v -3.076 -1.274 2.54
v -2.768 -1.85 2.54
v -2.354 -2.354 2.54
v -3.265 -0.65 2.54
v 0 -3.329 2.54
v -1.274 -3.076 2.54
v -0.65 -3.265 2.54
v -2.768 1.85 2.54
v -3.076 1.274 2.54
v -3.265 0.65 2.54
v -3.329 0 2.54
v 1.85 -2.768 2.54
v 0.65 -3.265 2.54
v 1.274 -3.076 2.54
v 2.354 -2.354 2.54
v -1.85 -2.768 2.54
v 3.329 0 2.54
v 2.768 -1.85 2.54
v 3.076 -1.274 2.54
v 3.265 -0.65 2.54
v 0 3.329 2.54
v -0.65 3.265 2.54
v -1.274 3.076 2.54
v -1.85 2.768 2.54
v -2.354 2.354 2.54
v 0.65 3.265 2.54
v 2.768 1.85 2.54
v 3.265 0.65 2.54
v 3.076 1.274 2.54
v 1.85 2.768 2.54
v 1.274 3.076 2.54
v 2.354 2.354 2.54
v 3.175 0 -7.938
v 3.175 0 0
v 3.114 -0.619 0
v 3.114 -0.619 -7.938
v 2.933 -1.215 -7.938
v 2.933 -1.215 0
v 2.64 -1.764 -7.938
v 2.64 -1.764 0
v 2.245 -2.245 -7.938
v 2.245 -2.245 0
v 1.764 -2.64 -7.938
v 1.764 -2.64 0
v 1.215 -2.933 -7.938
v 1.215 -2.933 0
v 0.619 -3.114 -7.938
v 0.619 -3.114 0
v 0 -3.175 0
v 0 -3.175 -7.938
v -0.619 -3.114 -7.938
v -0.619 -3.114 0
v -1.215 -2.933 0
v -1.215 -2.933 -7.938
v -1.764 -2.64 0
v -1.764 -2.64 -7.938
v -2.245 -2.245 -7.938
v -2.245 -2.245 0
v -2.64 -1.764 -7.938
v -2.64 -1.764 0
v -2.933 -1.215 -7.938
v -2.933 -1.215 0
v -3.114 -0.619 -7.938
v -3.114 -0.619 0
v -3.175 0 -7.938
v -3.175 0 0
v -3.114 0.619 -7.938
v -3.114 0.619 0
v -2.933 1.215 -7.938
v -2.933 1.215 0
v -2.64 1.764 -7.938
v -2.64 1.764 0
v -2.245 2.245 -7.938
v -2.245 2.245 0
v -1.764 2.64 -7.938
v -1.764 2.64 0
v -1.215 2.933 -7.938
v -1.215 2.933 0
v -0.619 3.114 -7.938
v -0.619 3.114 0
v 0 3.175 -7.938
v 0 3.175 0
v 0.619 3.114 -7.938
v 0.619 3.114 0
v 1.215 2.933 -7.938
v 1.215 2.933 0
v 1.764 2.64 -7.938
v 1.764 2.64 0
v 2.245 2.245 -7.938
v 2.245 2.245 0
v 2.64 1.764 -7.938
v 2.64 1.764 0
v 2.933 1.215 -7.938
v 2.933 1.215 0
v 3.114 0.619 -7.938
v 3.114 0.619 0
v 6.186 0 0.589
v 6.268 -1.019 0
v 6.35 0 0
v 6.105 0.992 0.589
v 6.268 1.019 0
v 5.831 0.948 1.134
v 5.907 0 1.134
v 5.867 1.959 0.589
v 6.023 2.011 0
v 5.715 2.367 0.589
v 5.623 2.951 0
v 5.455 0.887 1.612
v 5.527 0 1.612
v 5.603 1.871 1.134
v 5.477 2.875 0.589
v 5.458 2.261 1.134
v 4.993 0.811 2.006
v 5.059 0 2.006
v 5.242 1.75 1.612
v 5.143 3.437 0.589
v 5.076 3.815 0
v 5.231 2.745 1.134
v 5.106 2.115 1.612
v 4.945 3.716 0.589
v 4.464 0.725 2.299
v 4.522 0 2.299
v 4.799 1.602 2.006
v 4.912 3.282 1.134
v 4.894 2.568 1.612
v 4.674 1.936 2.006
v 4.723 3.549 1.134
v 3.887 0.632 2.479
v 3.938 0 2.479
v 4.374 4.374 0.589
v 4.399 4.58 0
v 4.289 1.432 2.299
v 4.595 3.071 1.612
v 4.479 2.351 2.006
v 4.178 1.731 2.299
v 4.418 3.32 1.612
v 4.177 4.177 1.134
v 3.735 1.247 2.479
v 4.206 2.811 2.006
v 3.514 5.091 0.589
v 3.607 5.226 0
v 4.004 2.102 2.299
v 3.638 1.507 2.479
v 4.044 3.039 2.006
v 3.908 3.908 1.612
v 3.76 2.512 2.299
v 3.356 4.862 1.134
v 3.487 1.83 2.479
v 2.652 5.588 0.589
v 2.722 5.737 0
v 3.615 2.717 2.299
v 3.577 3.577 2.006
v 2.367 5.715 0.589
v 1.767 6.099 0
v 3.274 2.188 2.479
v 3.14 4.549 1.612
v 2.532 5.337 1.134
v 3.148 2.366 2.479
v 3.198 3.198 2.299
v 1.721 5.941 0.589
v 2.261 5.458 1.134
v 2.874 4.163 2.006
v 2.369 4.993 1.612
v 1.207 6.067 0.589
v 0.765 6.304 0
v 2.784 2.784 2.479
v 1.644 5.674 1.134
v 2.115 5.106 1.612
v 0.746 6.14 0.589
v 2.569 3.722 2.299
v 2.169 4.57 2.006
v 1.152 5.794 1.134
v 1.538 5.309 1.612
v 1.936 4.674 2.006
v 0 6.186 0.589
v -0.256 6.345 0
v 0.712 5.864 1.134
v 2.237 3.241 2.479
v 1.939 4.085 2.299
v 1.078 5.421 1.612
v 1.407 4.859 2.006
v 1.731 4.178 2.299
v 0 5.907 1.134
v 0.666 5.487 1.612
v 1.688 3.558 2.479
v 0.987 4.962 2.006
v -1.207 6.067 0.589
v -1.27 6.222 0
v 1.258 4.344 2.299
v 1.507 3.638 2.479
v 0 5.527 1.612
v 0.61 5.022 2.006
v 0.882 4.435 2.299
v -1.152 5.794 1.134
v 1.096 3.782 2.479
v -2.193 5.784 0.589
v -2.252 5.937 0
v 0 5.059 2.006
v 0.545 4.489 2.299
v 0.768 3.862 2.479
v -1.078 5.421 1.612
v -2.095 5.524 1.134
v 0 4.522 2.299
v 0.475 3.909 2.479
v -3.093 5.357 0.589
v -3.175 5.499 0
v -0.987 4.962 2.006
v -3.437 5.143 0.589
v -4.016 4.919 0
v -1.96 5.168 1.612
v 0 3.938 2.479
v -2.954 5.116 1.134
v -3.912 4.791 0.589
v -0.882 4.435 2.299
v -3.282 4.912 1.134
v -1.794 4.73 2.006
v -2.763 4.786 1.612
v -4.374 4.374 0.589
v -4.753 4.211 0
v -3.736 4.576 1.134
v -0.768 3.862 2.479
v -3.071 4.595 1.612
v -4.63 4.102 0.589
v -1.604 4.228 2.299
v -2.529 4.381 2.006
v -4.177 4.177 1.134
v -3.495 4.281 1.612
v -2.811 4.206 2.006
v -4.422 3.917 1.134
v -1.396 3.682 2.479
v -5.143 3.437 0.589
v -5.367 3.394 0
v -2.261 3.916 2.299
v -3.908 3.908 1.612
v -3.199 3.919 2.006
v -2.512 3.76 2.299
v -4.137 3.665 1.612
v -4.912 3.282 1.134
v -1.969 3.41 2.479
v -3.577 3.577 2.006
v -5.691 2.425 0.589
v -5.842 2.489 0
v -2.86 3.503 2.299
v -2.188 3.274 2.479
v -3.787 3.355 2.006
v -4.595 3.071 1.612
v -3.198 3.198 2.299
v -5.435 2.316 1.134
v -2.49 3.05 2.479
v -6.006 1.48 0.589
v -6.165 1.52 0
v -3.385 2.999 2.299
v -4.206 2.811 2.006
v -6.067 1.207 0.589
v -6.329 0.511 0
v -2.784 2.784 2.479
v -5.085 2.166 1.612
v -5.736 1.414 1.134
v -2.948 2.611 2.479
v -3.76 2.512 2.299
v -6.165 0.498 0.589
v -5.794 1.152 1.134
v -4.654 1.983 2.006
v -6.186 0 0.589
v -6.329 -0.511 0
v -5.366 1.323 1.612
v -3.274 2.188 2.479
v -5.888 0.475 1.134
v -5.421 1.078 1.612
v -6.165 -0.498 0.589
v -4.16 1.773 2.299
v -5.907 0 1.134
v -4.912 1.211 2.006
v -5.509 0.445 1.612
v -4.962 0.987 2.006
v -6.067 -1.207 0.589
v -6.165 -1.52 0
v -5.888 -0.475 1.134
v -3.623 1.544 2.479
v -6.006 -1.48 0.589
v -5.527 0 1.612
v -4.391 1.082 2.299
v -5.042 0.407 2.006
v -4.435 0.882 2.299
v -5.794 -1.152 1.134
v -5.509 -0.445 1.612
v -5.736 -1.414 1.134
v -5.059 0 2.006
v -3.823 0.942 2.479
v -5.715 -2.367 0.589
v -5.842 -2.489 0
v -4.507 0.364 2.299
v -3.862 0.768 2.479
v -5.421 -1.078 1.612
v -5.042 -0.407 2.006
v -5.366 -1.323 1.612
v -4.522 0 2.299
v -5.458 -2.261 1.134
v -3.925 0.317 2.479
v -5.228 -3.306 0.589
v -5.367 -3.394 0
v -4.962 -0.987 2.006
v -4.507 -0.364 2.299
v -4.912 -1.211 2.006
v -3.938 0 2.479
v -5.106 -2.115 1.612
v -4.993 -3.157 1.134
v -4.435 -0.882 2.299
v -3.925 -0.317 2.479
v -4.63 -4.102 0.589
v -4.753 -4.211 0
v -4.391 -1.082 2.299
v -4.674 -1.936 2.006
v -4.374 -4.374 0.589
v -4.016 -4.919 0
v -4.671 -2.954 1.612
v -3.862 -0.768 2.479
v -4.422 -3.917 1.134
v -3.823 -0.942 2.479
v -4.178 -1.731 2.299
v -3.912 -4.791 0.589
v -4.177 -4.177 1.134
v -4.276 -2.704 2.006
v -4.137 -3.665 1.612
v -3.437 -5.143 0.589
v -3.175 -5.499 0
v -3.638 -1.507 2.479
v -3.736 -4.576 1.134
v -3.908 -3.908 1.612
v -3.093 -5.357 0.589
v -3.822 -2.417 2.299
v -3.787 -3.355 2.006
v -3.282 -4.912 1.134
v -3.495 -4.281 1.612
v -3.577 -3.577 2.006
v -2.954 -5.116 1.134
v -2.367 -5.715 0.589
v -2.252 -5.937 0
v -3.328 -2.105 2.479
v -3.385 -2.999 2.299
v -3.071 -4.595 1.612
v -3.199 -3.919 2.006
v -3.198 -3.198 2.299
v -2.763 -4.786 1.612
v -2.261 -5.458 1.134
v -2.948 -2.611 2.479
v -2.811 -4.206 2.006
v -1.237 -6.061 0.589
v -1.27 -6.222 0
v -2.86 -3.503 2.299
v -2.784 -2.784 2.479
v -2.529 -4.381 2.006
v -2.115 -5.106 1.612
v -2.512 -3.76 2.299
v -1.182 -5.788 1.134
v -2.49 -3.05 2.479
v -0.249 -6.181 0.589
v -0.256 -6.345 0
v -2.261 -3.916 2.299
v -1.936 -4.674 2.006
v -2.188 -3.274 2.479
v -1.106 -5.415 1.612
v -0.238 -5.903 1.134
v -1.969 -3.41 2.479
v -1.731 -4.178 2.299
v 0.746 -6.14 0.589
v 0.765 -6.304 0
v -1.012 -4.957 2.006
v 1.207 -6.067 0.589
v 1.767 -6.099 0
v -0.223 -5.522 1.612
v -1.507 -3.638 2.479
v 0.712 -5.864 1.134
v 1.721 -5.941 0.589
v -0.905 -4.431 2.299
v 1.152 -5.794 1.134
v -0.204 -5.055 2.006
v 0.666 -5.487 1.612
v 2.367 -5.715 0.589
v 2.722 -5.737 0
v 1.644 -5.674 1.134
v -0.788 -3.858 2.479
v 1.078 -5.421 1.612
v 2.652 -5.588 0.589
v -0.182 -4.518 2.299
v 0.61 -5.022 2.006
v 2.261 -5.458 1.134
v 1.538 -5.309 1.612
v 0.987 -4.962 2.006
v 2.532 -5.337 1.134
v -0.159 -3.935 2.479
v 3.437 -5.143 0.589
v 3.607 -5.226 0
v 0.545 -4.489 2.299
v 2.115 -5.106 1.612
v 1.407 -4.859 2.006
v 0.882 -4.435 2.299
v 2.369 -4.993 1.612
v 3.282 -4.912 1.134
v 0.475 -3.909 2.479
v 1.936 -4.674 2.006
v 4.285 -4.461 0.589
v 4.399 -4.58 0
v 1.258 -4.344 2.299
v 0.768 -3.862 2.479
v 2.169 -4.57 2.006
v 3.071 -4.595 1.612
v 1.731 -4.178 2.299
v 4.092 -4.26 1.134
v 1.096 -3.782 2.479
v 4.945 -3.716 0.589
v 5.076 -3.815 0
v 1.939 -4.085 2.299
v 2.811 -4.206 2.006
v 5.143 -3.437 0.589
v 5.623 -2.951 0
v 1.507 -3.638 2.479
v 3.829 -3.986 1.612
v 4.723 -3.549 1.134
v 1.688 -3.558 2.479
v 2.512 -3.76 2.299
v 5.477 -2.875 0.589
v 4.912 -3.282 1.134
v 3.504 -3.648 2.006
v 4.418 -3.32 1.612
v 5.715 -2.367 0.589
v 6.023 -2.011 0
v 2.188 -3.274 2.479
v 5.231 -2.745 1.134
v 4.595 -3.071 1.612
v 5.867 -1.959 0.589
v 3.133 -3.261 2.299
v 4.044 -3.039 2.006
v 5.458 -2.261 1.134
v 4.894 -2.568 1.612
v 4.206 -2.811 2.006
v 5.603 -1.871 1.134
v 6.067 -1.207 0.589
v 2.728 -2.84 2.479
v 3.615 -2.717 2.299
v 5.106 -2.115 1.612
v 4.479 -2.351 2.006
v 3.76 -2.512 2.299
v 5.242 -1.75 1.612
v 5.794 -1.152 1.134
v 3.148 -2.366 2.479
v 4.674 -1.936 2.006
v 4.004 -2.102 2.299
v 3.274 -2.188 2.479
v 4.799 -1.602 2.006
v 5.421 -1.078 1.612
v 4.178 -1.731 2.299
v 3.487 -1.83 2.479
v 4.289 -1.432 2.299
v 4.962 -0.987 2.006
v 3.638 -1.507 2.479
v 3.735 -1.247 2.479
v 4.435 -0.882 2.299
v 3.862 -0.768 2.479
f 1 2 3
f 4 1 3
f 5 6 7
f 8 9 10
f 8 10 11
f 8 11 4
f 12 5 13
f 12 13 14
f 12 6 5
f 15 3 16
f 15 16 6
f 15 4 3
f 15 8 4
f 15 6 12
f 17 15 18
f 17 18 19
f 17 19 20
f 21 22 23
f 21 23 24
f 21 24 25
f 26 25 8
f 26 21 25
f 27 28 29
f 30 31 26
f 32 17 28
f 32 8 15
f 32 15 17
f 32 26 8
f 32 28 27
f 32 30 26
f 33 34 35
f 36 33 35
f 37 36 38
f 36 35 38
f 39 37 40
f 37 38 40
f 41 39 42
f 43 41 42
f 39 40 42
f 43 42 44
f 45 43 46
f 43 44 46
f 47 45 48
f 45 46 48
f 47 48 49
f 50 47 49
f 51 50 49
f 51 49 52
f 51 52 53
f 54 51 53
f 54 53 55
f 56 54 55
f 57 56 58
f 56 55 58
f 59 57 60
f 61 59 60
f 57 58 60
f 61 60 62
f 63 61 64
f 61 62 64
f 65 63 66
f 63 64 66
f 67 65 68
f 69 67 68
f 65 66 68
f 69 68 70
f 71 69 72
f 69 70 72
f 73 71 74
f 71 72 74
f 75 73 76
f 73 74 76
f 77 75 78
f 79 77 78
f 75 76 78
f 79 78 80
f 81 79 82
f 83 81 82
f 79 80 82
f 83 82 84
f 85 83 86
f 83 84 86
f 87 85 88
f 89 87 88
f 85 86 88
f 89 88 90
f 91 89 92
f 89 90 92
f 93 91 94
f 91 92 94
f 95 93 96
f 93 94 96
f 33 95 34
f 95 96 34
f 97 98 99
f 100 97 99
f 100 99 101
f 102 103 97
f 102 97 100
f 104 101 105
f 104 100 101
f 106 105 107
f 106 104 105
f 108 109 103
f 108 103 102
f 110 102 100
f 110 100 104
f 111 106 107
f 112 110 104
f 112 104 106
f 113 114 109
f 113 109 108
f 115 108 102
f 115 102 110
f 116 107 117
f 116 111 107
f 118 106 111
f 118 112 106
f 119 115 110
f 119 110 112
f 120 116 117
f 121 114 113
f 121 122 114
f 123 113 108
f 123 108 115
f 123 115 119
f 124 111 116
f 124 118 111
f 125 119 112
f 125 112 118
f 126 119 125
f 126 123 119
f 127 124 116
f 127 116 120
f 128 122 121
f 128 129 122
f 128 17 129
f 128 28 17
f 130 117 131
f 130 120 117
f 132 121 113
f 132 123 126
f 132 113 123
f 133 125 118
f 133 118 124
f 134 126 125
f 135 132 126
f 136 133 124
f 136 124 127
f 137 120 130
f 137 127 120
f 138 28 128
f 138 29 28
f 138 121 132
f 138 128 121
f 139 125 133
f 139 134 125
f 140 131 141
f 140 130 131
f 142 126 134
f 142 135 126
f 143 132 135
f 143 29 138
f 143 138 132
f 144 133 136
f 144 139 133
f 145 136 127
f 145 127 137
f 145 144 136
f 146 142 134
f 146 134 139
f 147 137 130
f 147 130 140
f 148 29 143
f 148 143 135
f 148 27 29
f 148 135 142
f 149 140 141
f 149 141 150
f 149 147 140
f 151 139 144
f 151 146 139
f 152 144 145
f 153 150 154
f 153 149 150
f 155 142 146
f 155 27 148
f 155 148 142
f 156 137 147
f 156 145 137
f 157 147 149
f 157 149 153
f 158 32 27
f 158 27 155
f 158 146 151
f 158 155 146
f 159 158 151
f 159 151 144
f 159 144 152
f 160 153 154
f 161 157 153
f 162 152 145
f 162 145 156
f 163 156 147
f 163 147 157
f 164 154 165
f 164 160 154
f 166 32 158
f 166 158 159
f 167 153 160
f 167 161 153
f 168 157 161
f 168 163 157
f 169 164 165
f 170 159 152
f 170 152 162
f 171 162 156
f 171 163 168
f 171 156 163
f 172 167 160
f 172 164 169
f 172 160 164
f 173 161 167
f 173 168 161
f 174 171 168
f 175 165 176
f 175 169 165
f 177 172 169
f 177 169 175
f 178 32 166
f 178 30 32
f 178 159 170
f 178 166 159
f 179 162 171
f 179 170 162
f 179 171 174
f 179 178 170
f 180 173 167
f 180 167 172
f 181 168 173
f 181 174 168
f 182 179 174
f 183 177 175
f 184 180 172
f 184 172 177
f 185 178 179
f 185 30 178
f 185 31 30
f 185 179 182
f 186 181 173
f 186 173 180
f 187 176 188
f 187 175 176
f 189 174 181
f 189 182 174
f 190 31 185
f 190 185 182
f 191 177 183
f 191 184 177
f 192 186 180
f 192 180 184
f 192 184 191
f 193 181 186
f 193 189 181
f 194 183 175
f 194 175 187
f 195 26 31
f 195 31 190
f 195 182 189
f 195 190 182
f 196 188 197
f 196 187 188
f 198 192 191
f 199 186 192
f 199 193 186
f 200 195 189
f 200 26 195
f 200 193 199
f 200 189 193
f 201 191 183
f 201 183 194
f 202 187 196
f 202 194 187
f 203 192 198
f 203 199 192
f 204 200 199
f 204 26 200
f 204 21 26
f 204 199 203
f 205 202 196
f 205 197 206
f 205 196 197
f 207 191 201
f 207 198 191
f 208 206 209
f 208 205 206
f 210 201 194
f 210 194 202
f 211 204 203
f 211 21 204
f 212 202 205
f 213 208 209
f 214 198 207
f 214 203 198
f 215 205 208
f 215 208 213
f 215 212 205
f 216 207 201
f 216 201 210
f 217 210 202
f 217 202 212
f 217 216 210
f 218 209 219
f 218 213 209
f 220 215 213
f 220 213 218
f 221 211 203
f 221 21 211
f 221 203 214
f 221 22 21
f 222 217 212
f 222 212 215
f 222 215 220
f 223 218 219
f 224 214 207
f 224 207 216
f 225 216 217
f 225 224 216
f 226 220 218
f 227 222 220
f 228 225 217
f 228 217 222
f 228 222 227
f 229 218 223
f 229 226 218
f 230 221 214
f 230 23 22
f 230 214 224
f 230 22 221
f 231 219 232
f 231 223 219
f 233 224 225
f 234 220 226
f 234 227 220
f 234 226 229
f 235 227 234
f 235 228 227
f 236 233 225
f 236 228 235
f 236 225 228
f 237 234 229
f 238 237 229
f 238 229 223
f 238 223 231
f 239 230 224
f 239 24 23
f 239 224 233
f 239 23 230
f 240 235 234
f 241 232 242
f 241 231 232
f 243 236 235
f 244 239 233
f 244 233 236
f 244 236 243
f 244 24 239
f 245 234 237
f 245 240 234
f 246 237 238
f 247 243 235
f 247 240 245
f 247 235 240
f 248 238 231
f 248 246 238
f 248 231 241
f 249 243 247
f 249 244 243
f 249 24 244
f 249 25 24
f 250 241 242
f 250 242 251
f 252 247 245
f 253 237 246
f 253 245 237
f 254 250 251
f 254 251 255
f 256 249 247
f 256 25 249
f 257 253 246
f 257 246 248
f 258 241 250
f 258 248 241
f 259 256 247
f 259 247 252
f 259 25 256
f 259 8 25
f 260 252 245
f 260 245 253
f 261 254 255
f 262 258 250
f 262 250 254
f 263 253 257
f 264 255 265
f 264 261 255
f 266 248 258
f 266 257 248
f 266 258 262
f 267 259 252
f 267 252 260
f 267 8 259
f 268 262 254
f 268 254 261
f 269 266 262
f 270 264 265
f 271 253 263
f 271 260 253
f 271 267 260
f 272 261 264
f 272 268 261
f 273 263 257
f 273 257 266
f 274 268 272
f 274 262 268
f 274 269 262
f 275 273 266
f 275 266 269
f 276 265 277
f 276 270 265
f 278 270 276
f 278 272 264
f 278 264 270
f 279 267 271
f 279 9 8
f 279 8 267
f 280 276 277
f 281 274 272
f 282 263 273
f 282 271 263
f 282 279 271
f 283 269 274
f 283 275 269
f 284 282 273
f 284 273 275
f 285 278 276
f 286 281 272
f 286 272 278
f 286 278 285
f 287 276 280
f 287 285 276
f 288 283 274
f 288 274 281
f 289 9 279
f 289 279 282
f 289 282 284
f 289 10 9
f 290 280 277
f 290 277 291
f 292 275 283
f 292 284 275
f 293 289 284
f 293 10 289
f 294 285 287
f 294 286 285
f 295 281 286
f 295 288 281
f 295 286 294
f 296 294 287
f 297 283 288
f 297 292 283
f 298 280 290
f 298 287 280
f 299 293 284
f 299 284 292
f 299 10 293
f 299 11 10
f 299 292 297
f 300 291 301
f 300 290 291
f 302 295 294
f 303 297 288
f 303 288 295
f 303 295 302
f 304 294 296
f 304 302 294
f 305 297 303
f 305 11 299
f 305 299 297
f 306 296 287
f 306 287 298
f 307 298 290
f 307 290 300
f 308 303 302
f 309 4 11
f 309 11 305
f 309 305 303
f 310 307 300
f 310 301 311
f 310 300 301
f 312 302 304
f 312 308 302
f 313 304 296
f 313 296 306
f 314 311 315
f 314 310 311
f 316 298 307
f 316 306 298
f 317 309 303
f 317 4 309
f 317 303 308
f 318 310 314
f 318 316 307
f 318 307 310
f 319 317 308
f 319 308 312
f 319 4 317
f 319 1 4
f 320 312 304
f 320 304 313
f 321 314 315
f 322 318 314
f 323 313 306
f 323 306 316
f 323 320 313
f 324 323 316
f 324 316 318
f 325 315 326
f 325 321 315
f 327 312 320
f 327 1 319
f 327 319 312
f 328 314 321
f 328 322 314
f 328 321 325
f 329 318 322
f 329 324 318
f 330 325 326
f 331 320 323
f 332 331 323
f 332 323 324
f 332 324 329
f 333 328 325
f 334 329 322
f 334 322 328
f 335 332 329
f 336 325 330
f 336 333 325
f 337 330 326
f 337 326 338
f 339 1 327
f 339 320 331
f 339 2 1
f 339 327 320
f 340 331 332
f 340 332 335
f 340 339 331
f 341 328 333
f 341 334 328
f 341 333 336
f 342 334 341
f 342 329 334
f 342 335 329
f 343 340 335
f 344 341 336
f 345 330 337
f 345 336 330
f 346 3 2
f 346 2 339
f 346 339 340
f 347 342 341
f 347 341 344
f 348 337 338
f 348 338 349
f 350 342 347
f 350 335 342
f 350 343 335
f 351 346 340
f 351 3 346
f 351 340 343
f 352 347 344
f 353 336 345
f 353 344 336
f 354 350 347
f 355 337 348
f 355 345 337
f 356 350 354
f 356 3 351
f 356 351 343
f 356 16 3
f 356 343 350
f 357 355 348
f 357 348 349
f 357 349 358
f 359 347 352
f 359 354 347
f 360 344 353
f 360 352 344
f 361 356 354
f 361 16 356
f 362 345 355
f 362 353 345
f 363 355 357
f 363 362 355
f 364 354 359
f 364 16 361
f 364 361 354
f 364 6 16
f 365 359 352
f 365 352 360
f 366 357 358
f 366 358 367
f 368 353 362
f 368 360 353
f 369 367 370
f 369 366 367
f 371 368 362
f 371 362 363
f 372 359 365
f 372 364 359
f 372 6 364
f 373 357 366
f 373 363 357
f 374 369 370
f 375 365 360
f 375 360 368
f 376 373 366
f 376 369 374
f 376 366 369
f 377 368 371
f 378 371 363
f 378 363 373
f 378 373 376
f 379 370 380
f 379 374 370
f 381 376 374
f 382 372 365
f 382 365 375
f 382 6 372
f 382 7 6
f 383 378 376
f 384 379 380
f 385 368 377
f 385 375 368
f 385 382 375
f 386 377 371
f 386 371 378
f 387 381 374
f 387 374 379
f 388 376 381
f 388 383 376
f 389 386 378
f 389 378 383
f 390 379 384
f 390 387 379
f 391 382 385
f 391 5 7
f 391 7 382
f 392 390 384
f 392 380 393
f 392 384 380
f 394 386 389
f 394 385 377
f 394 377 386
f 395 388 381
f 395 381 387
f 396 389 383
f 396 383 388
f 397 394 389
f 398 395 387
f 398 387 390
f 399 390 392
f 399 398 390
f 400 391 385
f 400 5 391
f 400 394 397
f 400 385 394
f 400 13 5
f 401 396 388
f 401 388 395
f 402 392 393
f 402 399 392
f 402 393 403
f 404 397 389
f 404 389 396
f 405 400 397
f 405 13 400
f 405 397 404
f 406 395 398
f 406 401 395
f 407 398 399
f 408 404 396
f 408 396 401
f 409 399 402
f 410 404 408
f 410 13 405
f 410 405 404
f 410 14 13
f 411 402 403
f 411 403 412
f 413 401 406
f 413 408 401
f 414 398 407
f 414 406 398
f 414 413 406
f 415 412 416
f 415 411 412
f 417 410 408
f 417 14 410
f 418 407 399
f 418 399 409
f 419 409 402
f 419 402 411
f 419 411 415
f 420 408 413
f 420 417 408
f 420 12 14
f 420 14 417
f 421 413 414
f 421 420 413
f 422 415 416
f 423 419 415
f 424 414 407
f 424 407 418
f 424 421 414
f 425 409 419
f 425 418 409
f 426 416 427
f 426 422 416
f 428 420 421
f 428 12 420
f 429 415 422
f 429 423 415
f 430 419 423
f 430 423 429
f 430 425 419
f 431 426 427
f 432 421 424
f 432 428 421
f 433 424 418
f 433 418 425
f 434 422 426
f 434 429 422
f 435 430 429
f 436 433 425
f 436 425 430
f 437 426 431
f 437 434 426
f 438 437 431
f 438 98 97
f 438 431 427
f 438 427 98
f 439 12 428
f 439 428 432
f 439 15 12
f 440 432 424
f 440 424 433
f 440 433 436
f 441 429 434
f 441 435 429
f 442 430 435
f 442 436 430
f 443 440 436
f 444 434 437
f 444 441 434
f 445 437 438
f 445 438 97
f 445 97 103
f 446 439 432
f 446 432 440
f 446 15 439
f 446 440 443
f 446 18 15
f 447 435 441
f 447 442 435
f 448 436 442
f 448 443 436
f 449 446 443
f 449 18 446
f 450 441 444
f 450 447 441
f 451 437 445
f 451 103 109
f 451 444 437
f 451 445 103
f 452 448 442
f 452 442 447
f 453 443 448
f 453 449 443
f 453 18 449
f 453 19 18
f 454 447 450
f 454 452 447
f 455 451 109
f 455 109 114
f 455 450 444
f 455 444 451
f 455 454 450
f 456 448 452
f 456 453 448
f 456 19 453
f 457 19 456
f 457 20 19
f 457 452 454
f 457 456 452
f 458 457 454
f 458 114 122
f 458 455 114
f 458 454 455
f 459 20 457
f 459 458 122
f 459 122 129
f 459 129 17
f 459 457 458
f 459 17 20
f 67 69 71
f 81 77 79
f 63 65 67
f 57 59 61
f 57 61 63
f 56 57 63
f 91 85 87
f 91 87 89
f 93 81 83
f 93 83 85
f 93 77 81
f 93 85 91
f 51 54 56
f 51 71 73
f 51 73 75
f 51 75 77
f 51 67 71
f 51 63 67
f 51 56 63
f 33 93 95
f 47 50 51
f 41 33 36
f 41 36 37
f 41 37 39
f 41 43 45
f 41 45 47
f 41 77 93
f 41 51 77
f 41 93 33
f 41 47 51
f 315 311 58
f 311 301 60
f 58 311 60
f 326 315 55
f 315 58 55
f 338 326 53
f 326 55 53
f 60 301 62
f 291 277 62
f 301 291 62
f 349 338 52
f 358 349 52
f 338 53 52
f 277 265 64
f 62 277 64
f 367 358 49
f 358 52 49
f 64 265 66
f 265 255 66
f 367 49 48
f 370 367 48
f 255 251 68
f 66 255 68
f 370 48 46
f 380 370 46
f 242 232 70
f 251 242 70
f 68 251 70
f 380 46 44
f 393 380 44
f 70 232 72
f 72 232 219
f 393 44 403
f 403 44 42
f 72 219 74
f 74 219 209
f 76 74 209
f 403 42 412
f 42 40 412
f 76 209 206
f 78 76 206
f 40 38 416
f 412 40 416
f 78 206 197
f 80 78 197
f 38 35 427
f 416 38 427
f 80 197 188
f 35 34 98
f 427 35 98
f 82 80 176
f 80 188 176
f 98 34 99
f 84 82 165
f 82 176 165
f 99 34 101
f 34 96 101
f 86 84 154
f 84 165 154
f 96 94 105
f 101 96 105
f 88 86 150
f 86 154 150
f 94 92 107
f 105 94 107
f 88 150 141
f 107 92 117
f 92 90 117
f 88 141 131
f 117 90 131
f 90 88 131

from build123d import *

# Parameters (mm, degrees)
F0_R     = 6.35
F1_DEPTH = 2.54
F3_R     = 3.175
F4_DEPTH = 7.9375


# Not quite as in the source:
# - a fillet or chamfer that OpenCascade refuses, or shapes differently, is made with other operations: its cross-section is extruded or revolved along the edge and cut away or added


with BuildPart() as f1:
    # F0 (on Top) → F1 (new body)
    with BuildSketch(Plane.XY):
        Circle(F0_R)
    extrude(amount=F1_DEPTH)

    # F2: fillet of radius 3.0660512242 on 1 edges, made by hand

    # F2_s1 → F2_t2 (revolve, cut)
    with BuildSketch(Plane.XZ):
        with BuildLine():
            ThreePointArc((6.35, 0), (5.3027068749, 1.8206027884), (3.3294139279, 2.54))
            Line((3.3294139279, 2.54), (6.35, 2.54))
            Line((6.35, 2.54), (6.35, 0))
        make_face()
    revolve(axis=Axis((0, 0, 2.54), (0, 0, 1)), mode=Mode.SUBTRACT)

    # F3 (on face) → F4 (join)
    with BuildSketch(Plane(origin=(0, 0, 0), x_dir=(1, 0, 0), z_dir=(0, 0, -1))):
        Circle(F3_R)
    extrude(amount=F4_DEPTH)


solid = f1.part
